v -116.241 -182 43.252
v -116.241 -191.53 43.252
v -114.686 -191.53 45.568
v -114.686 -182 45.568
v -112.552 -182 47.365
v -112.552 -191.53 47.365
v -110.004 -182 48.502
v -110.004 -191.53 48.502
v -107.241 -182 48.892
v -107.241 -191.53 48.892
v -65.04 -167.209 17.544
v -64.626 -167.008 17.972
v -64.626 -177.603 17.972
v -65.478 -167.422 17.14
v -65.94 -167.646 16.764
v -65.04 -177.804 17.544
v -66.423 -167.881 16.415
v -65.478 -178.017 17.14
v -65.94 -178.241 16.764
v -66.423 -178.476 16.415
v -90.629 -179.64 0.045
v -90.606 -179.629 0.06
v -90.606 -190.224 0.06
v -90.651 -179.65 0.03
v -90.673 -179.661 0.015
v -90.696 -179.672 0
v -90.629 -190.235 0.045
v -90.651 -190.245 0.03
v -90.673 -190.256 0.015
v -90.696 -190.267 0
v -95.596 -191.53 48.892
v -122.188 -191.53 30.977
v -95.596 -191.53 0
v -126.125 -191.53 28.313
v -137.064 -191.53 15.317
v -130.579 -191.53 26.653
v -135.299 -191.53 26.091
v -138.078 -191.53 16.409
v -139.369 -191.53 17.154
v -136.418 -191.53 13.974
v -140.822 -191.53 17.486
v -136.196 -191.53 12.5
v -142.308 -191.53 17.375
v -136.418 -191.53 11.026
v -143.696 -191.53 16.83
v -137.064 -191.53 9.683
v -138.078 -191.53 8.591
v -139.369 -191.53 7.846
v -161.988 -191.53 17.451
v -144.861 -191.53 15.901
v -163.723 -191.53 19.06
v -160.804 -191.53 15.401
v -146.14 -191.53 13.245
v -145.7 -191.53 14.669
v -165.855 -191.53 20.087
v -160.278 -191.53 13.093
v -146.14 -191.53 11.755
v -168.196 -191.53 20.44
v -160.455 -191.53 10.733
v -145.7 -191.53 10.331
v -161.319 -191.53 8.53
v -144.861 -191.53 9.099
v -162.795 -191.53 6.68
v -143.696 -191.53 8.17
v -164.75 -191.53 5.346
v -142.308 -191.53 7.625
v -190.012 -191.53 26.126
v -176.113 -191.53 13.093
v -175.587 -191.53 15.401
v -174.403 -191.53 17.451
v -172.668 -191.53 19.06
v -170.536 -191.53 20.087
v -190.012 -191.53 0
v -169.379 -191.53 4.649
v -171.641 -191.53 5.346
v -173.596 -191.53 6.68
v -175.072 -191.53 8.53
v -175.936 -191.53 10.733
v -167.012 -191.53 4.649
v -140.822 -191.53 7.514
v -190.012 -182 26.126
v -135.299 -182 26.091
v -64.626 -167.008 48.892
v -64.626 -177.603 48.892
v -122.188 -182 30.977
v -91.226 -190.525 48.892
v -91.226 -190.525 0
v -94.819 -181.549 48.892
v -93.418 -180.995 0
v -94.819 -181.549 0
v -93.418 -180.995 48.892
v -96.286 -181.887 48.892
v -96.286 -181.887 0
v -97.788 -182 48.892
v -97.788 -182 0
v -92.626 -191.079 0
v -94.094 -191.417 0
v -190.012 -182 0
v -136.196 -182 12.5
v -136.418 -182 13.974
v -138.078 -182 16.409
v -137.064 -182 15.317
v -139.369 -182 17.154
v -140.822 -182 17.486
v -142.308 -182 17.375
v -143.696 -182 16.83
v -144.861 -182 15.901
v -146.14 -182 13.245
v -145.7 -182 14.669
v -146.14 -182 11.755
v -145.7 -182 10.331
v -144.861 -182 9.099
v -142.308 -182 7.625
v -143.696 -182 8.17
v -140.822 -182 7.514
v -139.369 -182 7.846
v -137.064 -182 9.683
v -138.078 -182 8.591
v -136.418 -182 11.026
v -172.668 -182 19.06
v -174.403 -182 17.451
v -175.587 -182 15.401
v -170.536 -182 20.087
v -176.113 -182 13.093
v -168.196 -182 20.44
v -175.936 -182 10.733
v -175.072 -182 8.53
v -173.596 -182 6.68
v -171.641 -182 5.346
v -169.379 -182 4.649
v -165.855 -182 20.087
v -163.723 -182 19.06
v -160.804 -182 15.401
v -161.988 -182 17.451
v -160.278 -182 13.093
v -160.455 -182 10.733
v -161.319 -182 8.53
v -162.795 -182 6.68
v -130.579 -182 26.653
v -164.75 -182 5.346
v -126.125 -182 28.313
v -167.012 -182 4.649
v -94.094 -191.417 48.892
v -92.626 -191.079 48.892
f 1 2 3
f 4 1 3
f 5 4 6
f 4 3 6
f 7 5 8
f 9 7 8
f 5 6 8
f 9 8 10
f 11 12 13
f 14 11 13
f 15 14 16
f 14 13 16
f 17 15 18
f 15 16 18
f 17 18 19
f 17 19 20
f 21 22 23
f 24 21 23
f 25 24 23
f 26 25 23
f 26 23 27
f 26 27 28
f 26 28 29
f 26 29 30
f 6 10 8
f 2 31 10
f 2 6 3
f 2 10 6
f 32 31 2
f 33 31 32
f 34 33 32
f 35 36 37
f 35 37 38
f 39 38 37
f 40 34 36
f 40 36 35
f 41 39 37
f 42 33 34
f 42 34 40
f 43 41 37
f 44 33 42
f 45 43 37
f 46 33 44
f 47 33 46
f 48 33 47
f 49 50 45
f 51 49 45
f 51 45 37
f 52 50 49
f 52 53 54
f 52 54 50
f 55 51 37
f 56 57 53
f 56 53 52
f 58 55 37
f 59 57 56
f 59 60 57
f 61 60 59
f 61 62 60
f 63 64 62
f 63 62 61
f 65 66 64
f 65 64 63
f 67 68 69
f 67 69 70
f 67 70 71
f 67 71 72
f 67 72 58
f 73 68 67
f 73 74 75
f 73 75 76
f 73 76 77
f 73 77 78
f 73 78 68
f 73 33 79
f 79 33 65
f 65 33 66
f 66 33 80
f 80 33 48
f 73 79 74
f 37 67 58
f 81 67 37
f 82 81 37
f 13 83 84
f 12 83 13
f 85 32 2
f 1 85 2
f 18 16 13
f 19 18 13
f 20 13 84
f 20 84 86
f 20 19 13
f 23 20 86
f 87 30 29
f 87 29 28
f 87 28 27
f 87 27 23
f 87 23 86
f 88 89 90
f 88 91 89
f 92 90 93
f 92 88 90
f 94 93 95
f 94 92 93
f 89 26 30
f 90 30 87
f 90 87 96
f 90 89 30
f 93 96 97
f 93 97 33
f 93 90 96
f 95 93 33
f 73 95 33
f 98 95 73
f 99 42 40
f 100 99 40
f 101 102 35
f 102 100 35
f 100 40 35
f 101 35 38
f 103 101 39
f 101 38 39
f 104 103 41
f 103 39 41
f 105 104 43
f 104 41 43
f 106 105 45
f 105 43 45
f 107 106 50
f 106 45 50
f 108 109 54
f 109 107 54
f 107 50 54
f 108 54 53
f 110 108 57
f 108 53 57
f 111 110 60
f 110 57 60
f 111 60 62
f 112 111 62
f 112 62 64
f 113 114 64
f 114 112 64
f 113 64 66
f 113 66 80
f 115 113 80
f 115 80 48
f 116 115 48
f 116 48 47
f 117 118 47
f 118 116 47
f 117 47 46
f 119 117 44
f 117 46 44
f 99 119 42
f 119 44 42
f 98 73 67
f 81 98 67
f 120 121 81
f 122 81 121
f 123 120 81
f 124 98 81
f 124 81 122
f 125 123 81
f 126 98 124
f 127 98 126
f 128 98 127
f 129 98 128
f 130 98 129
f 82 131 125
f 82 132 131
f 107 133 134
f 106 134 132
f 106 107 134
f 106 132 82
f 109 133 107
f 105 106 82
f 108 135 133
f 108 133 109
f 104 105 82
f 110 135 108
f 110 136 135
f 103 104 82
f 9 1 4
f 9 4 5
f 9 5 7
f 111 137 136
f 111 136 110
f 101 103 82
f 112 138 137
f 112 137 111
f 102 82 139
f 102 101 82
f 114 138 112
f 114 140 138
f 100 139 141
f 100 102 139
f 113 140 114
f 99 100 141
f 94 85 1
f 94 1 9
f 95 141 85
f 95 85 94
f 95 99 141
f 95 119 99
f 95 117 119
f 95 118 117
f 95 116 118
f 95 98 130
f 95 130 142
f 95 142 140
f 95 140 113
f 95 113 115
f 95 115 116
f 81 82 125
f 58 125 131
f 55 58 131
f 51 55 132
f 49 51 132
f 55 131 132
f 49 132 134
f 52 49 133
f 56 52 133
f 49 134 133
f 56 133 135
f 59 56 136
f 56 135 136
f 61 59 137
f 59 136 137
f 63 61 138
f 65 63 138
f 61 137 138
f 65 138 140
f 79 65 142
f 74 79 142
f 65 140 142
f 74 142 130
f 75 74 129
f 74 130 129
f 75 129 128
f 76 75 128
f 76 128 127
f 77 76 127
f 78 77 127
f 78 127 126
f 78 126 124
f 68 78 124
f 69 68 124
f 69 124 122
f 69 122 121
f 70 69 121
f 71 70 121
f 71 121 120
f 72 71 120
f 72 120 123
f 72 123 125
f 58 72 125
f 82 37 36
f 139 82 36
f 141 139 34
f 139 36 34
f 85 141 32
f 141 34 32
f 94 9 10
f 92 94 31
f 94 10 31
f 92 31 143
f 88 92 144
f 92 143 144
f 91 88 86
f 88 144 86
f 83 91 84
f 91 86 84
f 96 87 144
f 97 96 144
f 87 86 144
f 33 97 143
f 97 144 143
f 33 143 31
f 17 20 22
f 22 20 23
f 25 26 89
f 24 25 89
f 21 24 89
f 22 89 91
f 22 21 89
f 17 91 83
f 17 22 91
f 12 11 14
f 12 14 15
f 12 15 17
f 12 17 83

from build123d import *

# Parameters (mm, degrees)
SALIENTE_EXTRUIR1_DEPTH    = 100
CORTAR_EXTRUIR3_START      = -9.53
CORTAR_EXTRUIR3_DEPTH      = 27.53
CORTAR_EXTRUIR4_DEPTH      = 217.130875219
CORTAR_EXTRUIR4_DEPTH_BACK = 217.130875219
CROQUIS5_R                 = 6
CORTAR_EXTRUIR5_DEPTH      = 216.124741308
CORTAR_EXTRUIR5_DEPTH_BACK = 216.124741308
CROQUIS6_R                 = 5
SALIENTE_EXTRUIR5_START    = 15.13
CROQUIS12_R                = 8
CROQUIS12_R_2              = 6
SALIENTE_EXTRUIR5_DEPTH    = 15.13
CROQUIS14_R                = 10
CROQUIS14_R_2              = 6
SALIENTE_EXTRUIR6_DEPTH    = 14.13
REDONDEO1_R                = 10
CROQUIS15_R                = 129.913958972
CORTAR_EXTRUIR6_DEPTH      = 241.731126452
CORTAR_EXTRUIR7_DEPTH      = 241.731126452
CORTAR_EXTRUIR7_DEPTH_BACK = 241.731126452
CROQUIS16_R                = 167.818918699
CROQUIS16_W                = 152.833455663
CROQUIS16_H                = 57.32474986
CROQUIS17_R                = 7.94
CORTAR_EXTRUIR8_DEPTH      = 275.18730081


# Read off the part's stored shape, not the designer's step: Cortar-Extruir3
with BuildPart() as part:
    # Croquis1 → Saliente-Extruir1 (new body)
    with BuildSketch(Plane(origin=(0, 0, 0), x_dir=(-1, 0, 0), z_dir=(0, 0, 1))):
        Polygon((197, -18), (95.487511072, -18), (58.434265153, 0), (0, 0), (0, -9.53), (56.241982635, -9.53), (93.295228555, -27.53), (197, -27.53), align=None)
    extrude(amount=SALIENTE_EXTRUIR1_DEPTH)

    # Cortar-Extruir3 outline → Cortar-Extruir3 (cut)
    with BuildSketch(Plane.XZ.offset(-18).offset(CORTAR_EXTRUIR3_START)):
        with BuildLine():
            ThreePointArc((-55.249840127, 84.500440573), (-26.332291795, 96.782267833), (-21.152892526, 65.794500802))
            Line((-21.152892526, 65.794500802), (-64.625951049, 17.972279409))
            ThreePointArc((-64.625951049, 17.972279409), (-65.478127712, 17.140282818), (-66.423173576, 16.415498915))
            Line((-66.423173576, 16.415498915), (-90.606375863, 0.05961622))
            ThreePointArc((-90.606375863, 0.05961622), (-90.650882543, 0.029688544), (-90.695549093, 0))
            Line((-90.695549093, 0), (0, 0))
            Line((0, 0), (0, 100))
            Line((0, 100), (-197, 100))
            Line((-197, 100), (-197, 0))
            Line((-197, 0), (-190.011984345, 0))
            Line((-190.011984345, 0), (-190.011984345, 26.126101457))
            Line((-190.011984345, 26.126101457), (-135.299104154, 26.091319242))
            ThreePointArc((-135.299104154, 26.091319242), (-128.302319283, 27.350377114), (-122.187975643, 30.977363067))
            Line((-122.187975643, 30.977363067), (-116.240808663, 43.251828603))
            ThreePointArc((-116.240808663, 43.251828603), (-112.551713447, 47.365099857), (-107.241491018, 48.891521053))
            Line((-107.241491018, 48.891521053), (-89.308606426, 48.891521053))
            ThreePointArc((-89.308606426, 48.891521053), (-87.268864218, 49.101758455), (-85.31488803, 49.723630708))
            ThreePointArc((-85.31488803, 49.723630708), (-66.329070141, 63.694356674), (-55.249840127, 84.500440573))
        make_face()
    extrude(amount=CORTAR_EXTRUIR3_DEPTH, mode=Mode.SUBTRACT)

    # Croquis5 → Cortar-Extruir4 (cut, two sides: drawn at the far end of the back side and taken through both)
    with BuildSketch(Plane.XZ.offset(-CORTAR_EXTRUIR4_DEPTH_BACK)):
        with Locations(Location((-35.951954024, 79.247670643, 0), (0, 0, 270))):
            Circle(CROQUIS5_R)
    extrude(amount=CORTAR_EXTRUIR4_DEPTH + CORTAR_EXTRUIR4_DEPTH_BACK, mode=Mode.SUBTRACT)

    # Croquis6 → Cortar-Extruir5 (cut, two sides: drawn at the far end of the back side and taken through both)
    with BuildSketch(Plane.XZ.offset(-18).offset(-CORTAR_EXTRUIR5_DEPTH_BACK)):
        with Locations((-168.195527475, 12.5)):
            Circle(CROQUIS6_R)
        with Locations((-141.195527475, 12.5)):
            Circle(CROQUIS6_R)
    extrude(amount=CORTAR_EXTRUIR5_DEPTH + CORTAR_EXTRUIR5_DEPTH_BACK, mode=Mode.SUBTRACT)

    # Croquis12 → Saliente-Extruir5 (add)
    with BuildSketch(Plane.XZ.offset(SALIENTE_EXTRUIR5_START)):
        with Locations(Location((-35.951954024, 79.247670643, 0), (0, 0, 90))):
            Circle(CROQUIS12_R)
        with Locations(Location((-35.951954024, 79.247670643, 0), (0, 0, 270))):
            Circle(CROQUIS12_R_2, mode=Mode.SUBTRACT)
    extrude(amount=-SALIENTE_EXTRUIR5_DEPTH)

    # Croquis14 → Saliente-Extruir6 (add)
    with BuildSketch(Plane(origin=(0, -14.13, 0), x_dir=(-1, 0, 0), z_dir=(0, -1, 0))):
        with Locations(Location((35.951954024, -79.247670643, 0), (0, 0, 90))):
            Circle(CROQUIS14_R)
        with Locations(Location((35.951954024, -79.247670643, 0), (0, 0, 90))):
            Circle(CROQUIS14_R_2, mode=Mode.SUBTRACT)
    extrude(amount=-SALIENTE_EXTRUIR6_DEPTH)

    # Redondeo1
    redondeo1_edges = [part.edges().sort_by_distance(p)[0] for p in [
        (-95.487511072, 18, 24.445760526),
        (-58.434265153, 0, 50.31488072),
        (-93.295228555, 27.53, 24.445760526),
        (-56.241982635, 9.53, 54.230230798),
    ]]
    fillet(redondeo1_edges, radius=REDONDEO1_R)


with BuildPart() as body_2:
    # Simetría1: mirrored copy
    add(part.part.mirror(Plane(origin=(0, -82, 0), x_dir=(0, 0, 1), z_dir=(0, -1, 0))))


with BuildPart() as part_1:
    add(part.part)

    # Croquis15 → Cortar-Extruir6 (cut, through all)
    with BuildSketch(Plane(origin=(0, -82, 0), x_dir=(-1, 0, 0), z_dir=(0, -1, 0))):
        with Locations((137.546426993, -18.622395962)):
            Circle(CROQUIS15_R)
    extrude(amount=-CORTAR_EXTRUIR6_DEPTH, mode=Mode.SUBTRACT)


with BuildPart() as cortar_extruir7_tool:
    # Croquis16 → Cortar-Extruir7 (new, two sides: drawn at the far end of the back side and taken through both)
    with BuildSketch(Plane(origin=(0, -82, 0), x_dir=(-1, 0, 0), z_dir=(0, -1, 0)).offset(-CORTAR_EXTRUIR7_DEPTH_BACK)):
        with Locations((140.265045612, -47.269752677)):
            Circle(CROQUIS16_R)
        with Locations((141.042678881, -20.229146123)):
            Rectangle(CROQUIS16_W, CROQUIS16_H, mode=Mode.SUBTRACT)
    extrude(amount=CORTAR_EXTRUIR7_DEPTH + CORTAR_EXTRUIR7_DEPTH_BACK)


with BuildPart() as part_2:
    add(part_1.part)

    # Cortar-Extruir7: cut by cortar_extruir7_tool
    add(cortar_extruir7_tool.part, mode=Mode.SUBTRACT)


with BuildPart() as body_2_1:
    add(body_2.part)

    # Cortar-Extruir7: cut by cortar_extruir7_tool
    add(cortar_extruir7_tool.part, mode=Mode.SUBTRACT)

    # Croquis17 → Cortar-Extruir8 (cut, through all)
    with BuildSketch(Plane(origin=(0, 0, 0), x_dir=(1, 0, 0), z_dir=(0, 1, 0))):
        with Locations(Location((-168.195527475, -12.5, 0), (0, 0, 270))):
            Circle(CROQUIS17_R)
    extrude(amount=-CORTAR_EXTRUIR8_DEPTH, mode=Mode.SUBTRACT)


solid = body_2_1.part
